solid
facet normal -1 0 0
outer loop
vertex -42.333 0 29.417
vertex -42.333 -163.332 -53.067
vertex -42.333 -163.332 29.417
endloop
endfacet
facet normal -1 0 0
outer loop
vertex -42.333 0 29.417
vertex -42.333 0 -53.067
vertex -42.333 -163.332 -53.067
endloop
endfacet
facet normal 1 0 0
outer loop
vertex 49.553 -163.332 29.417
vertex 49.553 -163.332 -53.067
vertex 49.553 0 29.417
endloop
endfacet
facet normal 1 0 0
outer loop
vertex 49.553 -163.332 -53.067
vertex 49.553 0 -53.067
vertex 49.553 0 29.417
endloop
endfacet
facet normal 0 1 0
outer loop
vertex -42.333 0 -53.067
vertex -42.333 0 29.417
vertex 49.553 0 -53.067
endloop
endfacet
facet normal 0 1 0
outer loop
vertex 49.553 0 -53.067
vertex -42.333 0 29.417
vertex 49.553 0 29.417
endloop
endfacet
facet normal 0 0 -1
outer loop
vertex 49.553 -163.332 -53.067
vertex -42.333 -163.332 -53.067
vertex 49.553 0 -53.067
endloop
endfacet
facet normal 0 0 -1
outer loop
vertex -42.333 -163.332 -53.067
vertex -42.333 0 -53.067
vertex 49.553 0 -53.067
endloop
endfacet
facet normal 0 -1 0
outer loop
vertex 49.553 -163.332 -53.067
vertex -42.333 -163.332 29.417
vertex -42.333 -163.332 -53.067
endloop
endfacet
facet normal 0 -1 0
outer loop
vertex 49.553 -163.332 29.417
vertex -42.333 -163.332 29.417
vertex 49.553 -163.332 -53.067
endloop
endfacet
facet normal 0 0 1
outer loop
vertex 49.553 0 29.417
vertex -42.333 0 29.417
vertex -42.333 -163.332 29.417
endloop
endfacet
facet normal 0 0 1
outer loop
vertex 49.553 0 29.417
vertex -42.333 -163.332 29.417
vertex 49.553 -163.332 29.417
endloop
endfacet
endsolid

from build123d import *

# Parameters (mm, degrees)
F0_W       = 91.8862894177
F0_H       = 82.4839714915
F1_DEPTH   = 112.53249
F1_FACE_W  = 91.8862894177
F1_FACE_H  = 82.4839714915
F2_R       = 18.7587745479
F1_FACE1_W = 91.8862894177
F1_FACE1_H = 82.4839714915
F3_DEPTH   = 25.4
F4_DEPTH   = 25.4


with BuildPart() as f1:
    # F0 (on Front) → F1 (new body)
    with BuildSketch(Plane.XZ):
        with Locations((3.6097988486, -11.8252029642)):
            Rectangle(F0_W, F0_H)
    extrude(amount=F1_DEPTH)

    # F1_face (on face) + F2 (on Front) + F1_face1 (on face) → F3 (join)
    with BuildSketch(Plane(origin=(3.6097988486, -112.53249, -11.8252029642), x_dir=(1, 0, 0), z_dir=(0, -1, 0))):
        Rectangle(F1_FACE_W, F1_FACE_H)
    with BuildSketch(Plane.XZ):
        with Locations((-13.4063102305, -3.2802673522)):
            Circle(F2_R)
    with BuildSketch(Plane(origin=(3.6097988486, 0, -11.8252029642), x_dir=(1, 0, 0), z_dir=(0, 1, 0))):
        Rectangle(F1_FACE1_W, F1_FACE1_H)
    extrude(amount=F3_DEPTH, dir=(0, -1, 0))

    # F4 (add): faces of the model
    f4_faces = [f1.faces().sort_by_distance(p)[0] for p in [
        (3.6097988486, -137.93249, -11.8252029642),
        (3.6097988486, 0, -11.8252029642),
    ]]
    extrude(f4_faces, amount=F4_DEPTH, dir=(0, -1, 0))


solid = f1.part
